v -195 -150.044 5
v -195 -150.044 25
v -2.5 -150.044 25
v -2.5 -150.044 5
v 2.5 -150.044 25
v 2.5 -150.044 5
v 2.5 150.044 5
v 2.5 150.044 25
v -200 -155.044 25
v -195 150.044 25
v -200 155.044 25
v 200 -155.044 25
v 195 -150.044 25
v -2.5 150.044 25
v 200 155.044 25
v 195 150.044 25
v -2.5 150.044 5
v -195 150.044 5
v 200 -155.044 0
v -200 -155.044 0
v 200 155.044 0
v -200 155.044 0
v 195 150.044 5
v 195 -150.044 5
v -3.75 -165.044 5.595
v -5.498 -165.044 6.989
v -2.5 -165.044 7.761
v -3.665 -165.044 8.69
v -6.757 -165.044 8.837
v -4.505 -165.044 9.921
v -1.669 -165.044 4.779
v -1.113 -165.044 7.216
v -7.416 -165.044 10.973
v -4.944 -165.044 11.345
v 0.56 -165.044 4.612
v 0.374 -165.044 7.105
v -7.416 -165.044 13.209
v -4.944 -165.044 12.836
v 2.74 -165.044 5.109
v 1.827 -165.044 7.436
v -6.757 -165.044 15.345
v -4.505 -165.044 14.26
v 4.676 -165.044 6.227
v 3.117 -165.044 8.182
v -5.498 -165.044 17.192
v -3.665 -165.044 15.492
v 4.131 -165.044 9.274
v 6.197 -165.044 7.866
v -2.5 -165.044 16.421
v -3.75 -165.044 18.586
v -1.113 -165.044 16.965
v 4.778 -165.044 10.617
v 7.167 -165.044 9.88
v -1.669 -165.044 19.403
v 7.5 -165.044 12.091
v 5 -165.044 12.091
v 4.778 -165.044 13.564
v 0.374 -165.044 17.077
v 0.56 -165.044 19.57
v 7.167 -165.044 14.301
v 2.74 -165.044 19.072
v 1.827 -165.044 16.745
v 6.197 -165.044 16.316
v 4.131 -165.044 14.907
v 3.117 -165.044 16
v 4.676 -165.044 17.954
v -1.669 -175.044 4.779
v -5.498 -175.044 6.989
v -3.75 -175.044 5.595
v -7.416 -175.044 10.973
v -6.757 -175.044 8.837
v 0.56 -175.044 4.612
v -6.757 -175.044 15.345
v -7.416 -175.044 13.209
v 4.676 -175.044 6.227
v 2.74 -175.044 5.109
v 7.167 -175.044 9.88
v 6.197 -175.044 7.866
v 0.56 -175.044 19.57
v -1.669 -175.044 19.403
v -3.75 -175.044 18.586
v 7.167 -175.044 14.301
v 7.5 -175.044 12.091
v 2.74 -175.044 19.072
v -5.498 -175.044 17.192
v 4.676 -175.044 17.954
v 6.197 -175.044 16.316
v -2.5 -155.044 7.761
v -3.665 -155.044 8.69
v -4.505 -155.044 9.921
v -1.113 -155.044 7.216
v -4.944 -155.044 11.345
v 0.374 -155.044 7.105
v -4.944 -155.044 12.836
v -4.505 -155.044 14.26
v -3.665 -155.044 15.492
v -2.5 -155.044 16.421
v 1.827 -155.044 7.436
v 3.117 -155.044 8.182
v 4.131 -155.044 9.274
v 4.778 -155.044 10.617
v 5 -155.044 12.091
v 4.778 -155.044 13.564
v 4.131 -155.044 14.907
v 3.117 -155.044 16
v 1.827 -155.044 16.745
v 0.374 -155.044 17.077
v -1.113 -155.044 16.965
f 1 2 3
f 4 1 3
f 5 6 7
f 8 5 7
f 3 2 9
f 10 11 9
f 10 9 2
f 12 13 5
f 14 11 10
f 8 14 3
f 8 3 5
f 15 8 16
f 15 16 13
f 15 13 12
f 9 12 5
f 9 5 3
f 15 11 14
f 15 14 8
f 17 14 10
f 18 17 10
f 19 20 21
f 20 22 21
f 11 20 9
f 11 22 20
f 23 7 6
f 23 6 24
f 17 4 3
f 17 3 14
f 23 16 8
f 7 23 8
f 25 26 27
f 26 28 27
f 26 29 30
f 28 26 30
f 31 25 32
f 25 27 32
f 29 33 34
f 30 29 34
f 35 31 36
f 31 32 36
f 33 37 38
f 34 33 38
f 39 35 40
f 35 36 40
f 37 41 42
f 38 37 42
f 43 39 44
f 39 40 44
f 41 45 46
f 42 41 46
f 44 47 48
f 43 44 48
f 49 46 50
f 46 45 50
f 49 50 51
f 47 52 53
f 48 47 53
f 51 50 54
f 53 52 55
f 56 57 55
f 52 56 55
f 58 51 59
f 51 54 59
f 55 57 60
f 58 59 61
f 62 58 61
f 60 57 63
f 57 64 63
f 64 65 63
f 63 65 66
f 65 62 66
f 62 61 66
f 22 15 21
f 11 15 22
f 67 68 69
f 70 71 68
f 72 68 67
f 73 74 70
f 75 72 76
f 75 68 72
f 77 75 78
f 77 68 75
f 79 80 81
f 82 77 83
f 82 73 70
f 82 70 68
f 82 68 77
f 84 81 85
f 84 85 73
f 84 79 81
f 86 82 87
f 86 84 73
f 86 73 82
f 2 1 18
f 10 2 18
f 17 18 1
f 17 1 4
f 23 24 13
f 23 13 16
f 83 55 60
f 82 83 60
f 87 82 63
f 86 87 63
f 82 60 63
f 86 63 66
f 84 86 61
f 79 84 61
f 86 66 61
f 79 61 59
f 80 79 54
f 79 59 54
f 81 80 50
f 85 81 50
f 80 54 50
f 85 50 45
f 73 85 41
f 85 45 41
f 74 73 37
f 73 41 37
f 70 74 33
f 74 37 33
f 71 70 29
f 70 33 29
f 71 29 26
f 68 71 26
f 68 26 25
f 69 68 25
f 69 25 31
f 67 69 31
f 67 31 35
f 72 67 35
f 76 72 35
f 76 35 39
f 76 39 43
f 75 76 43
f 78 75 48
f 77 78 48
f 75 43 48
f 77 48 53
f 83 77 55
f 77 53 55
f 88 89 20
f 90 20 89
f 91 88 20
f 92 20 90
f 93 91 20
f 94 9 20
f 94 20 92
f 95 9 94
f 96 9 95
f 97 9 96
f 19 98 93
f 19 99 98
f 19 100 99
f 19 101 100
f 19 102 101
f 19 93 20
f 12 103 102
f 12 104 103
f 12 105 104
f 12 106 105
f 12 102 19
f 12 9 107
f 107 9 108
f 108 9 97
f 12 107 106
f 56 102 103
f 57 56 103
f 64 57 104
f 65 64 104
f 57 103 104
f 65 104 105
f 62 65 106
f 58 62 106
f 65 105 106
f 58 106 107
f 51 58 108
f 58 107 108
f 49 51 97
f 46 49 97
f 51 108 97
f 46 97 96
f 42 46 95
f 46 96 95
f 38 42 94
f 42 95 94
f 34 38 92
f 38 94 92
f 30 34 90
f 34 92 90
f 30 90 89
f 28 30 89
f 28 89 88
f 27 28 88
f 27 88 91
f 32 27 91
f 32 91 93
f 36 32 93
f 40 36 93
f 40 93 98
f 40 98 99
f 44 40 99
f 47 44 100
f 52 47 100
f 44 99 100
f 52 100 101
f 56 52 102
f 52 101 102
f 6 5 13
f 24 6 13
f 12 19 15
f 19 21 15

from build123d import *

# Parameters (mm, degrees)
F0_W      = 38.3663107641
F0_H      = 42.2096475959
F1_DEPTH  = 0.6858
F3_W      = 400
F3_H      = 300.087749958
F4_DEPTH  = 5
F5_W      = 5
F5_H      = 300.087749958
F6_DEPTH  = 20
F7_W      = 5
F7_H      = 300.087749958
F8_DEPTH  = 20
F9_W      = 400
F9_H      = 25
F10_DEPTH = 5
F11_W     = 5
F11_H     = 300.087749958
F12_DEPTH = 20
F13_W     = 400
F13_H     = 25
F14_DEPTH = 5
F15_R     = 5
F16_DEPTH = 10
F17_R     = 7.5
F17_R_2   = 5
F18_DEPTH = 10


with BuildPart() as f1:
    # F0 (on Top) → F1 (new body)
    with BuildSketch(Plane.XY):
        with Locations((-14.0401979443, 21.1048237979)):
            Rectangle(F0_W, F0_H)
    extrude(amount=F1_DEPTH)


with BuildPart() as f4:
    # F3 (on Top) → F4 (new body)
    with BuildSketch(Plane.XY):
        Rectangle(F3_W, F3_H)
    extrude(amount=F4_DEPTH)

    # F5 (on face) → F6 (join)
    with BuildSketch(Plane.XY.offset(5)):
        with Locations((-197.5, 0)):
            Rectangle(F5_W, F5_H)
    extrude(amount=F6_DEPTH)

    # F7 (on face) → F8 (join)
    with BuildSketch(Plane.XY.offset(5)):
        with Locations((197.5, 0)):
            Rectangle(F7_W, F7_H)
    extrude(amount=F8_DEPTH)

    # F9 (on face) → F10 (join)
    with BuildSketch(Plane(origin=(0, 150.043874979, 0), x_dir=(-1, 0, 0), z_dir=(0, 1, 0))):
        with Locations((0, 12.5)):
            Rectangle(F9_W, F9_H)
    extrude(amount=F10_DEPTH)

    # F11 (on face) → F12 (join)
    with BuildSketch(Plane.XY.offset(5)):
        Rectangle(F11_W, F11_H)
    extrude(amount=F12_DEPTH)

    # F13 (on face) → F14 (join)
    with BuildSketch(Plane.XZ.offset(150.043874979)):
        with Locations((0, 12.5)):
            Rectangle(F13_W, F13_H)
    extrude(amount=F14_DEPTH)

    # F15 (on face) → F16 (join)
    with BuildSketch(Plane.XZ.offset(155.043874979)):
        with Locations((0, 12.090690434)):
            Circle(F15_R)
    extrude(amount=F16_DEPTH)

    # F17 (on face) → F18 (join)
    with BuildSketch(Plane.XZ.offset(165.043874979)):
        with Locations((0, 12.090690434)):
            Circle(F17_R)
        with Locations((0, 12.090690434)):
            Circle(F17_R_2, mode=Mode.SUBTRACT)
        with Locations((0, 12.090690434)):
            Circle(F17_R_2)
    extrude(amount=F18_DEPTH)


solid = f4.part
